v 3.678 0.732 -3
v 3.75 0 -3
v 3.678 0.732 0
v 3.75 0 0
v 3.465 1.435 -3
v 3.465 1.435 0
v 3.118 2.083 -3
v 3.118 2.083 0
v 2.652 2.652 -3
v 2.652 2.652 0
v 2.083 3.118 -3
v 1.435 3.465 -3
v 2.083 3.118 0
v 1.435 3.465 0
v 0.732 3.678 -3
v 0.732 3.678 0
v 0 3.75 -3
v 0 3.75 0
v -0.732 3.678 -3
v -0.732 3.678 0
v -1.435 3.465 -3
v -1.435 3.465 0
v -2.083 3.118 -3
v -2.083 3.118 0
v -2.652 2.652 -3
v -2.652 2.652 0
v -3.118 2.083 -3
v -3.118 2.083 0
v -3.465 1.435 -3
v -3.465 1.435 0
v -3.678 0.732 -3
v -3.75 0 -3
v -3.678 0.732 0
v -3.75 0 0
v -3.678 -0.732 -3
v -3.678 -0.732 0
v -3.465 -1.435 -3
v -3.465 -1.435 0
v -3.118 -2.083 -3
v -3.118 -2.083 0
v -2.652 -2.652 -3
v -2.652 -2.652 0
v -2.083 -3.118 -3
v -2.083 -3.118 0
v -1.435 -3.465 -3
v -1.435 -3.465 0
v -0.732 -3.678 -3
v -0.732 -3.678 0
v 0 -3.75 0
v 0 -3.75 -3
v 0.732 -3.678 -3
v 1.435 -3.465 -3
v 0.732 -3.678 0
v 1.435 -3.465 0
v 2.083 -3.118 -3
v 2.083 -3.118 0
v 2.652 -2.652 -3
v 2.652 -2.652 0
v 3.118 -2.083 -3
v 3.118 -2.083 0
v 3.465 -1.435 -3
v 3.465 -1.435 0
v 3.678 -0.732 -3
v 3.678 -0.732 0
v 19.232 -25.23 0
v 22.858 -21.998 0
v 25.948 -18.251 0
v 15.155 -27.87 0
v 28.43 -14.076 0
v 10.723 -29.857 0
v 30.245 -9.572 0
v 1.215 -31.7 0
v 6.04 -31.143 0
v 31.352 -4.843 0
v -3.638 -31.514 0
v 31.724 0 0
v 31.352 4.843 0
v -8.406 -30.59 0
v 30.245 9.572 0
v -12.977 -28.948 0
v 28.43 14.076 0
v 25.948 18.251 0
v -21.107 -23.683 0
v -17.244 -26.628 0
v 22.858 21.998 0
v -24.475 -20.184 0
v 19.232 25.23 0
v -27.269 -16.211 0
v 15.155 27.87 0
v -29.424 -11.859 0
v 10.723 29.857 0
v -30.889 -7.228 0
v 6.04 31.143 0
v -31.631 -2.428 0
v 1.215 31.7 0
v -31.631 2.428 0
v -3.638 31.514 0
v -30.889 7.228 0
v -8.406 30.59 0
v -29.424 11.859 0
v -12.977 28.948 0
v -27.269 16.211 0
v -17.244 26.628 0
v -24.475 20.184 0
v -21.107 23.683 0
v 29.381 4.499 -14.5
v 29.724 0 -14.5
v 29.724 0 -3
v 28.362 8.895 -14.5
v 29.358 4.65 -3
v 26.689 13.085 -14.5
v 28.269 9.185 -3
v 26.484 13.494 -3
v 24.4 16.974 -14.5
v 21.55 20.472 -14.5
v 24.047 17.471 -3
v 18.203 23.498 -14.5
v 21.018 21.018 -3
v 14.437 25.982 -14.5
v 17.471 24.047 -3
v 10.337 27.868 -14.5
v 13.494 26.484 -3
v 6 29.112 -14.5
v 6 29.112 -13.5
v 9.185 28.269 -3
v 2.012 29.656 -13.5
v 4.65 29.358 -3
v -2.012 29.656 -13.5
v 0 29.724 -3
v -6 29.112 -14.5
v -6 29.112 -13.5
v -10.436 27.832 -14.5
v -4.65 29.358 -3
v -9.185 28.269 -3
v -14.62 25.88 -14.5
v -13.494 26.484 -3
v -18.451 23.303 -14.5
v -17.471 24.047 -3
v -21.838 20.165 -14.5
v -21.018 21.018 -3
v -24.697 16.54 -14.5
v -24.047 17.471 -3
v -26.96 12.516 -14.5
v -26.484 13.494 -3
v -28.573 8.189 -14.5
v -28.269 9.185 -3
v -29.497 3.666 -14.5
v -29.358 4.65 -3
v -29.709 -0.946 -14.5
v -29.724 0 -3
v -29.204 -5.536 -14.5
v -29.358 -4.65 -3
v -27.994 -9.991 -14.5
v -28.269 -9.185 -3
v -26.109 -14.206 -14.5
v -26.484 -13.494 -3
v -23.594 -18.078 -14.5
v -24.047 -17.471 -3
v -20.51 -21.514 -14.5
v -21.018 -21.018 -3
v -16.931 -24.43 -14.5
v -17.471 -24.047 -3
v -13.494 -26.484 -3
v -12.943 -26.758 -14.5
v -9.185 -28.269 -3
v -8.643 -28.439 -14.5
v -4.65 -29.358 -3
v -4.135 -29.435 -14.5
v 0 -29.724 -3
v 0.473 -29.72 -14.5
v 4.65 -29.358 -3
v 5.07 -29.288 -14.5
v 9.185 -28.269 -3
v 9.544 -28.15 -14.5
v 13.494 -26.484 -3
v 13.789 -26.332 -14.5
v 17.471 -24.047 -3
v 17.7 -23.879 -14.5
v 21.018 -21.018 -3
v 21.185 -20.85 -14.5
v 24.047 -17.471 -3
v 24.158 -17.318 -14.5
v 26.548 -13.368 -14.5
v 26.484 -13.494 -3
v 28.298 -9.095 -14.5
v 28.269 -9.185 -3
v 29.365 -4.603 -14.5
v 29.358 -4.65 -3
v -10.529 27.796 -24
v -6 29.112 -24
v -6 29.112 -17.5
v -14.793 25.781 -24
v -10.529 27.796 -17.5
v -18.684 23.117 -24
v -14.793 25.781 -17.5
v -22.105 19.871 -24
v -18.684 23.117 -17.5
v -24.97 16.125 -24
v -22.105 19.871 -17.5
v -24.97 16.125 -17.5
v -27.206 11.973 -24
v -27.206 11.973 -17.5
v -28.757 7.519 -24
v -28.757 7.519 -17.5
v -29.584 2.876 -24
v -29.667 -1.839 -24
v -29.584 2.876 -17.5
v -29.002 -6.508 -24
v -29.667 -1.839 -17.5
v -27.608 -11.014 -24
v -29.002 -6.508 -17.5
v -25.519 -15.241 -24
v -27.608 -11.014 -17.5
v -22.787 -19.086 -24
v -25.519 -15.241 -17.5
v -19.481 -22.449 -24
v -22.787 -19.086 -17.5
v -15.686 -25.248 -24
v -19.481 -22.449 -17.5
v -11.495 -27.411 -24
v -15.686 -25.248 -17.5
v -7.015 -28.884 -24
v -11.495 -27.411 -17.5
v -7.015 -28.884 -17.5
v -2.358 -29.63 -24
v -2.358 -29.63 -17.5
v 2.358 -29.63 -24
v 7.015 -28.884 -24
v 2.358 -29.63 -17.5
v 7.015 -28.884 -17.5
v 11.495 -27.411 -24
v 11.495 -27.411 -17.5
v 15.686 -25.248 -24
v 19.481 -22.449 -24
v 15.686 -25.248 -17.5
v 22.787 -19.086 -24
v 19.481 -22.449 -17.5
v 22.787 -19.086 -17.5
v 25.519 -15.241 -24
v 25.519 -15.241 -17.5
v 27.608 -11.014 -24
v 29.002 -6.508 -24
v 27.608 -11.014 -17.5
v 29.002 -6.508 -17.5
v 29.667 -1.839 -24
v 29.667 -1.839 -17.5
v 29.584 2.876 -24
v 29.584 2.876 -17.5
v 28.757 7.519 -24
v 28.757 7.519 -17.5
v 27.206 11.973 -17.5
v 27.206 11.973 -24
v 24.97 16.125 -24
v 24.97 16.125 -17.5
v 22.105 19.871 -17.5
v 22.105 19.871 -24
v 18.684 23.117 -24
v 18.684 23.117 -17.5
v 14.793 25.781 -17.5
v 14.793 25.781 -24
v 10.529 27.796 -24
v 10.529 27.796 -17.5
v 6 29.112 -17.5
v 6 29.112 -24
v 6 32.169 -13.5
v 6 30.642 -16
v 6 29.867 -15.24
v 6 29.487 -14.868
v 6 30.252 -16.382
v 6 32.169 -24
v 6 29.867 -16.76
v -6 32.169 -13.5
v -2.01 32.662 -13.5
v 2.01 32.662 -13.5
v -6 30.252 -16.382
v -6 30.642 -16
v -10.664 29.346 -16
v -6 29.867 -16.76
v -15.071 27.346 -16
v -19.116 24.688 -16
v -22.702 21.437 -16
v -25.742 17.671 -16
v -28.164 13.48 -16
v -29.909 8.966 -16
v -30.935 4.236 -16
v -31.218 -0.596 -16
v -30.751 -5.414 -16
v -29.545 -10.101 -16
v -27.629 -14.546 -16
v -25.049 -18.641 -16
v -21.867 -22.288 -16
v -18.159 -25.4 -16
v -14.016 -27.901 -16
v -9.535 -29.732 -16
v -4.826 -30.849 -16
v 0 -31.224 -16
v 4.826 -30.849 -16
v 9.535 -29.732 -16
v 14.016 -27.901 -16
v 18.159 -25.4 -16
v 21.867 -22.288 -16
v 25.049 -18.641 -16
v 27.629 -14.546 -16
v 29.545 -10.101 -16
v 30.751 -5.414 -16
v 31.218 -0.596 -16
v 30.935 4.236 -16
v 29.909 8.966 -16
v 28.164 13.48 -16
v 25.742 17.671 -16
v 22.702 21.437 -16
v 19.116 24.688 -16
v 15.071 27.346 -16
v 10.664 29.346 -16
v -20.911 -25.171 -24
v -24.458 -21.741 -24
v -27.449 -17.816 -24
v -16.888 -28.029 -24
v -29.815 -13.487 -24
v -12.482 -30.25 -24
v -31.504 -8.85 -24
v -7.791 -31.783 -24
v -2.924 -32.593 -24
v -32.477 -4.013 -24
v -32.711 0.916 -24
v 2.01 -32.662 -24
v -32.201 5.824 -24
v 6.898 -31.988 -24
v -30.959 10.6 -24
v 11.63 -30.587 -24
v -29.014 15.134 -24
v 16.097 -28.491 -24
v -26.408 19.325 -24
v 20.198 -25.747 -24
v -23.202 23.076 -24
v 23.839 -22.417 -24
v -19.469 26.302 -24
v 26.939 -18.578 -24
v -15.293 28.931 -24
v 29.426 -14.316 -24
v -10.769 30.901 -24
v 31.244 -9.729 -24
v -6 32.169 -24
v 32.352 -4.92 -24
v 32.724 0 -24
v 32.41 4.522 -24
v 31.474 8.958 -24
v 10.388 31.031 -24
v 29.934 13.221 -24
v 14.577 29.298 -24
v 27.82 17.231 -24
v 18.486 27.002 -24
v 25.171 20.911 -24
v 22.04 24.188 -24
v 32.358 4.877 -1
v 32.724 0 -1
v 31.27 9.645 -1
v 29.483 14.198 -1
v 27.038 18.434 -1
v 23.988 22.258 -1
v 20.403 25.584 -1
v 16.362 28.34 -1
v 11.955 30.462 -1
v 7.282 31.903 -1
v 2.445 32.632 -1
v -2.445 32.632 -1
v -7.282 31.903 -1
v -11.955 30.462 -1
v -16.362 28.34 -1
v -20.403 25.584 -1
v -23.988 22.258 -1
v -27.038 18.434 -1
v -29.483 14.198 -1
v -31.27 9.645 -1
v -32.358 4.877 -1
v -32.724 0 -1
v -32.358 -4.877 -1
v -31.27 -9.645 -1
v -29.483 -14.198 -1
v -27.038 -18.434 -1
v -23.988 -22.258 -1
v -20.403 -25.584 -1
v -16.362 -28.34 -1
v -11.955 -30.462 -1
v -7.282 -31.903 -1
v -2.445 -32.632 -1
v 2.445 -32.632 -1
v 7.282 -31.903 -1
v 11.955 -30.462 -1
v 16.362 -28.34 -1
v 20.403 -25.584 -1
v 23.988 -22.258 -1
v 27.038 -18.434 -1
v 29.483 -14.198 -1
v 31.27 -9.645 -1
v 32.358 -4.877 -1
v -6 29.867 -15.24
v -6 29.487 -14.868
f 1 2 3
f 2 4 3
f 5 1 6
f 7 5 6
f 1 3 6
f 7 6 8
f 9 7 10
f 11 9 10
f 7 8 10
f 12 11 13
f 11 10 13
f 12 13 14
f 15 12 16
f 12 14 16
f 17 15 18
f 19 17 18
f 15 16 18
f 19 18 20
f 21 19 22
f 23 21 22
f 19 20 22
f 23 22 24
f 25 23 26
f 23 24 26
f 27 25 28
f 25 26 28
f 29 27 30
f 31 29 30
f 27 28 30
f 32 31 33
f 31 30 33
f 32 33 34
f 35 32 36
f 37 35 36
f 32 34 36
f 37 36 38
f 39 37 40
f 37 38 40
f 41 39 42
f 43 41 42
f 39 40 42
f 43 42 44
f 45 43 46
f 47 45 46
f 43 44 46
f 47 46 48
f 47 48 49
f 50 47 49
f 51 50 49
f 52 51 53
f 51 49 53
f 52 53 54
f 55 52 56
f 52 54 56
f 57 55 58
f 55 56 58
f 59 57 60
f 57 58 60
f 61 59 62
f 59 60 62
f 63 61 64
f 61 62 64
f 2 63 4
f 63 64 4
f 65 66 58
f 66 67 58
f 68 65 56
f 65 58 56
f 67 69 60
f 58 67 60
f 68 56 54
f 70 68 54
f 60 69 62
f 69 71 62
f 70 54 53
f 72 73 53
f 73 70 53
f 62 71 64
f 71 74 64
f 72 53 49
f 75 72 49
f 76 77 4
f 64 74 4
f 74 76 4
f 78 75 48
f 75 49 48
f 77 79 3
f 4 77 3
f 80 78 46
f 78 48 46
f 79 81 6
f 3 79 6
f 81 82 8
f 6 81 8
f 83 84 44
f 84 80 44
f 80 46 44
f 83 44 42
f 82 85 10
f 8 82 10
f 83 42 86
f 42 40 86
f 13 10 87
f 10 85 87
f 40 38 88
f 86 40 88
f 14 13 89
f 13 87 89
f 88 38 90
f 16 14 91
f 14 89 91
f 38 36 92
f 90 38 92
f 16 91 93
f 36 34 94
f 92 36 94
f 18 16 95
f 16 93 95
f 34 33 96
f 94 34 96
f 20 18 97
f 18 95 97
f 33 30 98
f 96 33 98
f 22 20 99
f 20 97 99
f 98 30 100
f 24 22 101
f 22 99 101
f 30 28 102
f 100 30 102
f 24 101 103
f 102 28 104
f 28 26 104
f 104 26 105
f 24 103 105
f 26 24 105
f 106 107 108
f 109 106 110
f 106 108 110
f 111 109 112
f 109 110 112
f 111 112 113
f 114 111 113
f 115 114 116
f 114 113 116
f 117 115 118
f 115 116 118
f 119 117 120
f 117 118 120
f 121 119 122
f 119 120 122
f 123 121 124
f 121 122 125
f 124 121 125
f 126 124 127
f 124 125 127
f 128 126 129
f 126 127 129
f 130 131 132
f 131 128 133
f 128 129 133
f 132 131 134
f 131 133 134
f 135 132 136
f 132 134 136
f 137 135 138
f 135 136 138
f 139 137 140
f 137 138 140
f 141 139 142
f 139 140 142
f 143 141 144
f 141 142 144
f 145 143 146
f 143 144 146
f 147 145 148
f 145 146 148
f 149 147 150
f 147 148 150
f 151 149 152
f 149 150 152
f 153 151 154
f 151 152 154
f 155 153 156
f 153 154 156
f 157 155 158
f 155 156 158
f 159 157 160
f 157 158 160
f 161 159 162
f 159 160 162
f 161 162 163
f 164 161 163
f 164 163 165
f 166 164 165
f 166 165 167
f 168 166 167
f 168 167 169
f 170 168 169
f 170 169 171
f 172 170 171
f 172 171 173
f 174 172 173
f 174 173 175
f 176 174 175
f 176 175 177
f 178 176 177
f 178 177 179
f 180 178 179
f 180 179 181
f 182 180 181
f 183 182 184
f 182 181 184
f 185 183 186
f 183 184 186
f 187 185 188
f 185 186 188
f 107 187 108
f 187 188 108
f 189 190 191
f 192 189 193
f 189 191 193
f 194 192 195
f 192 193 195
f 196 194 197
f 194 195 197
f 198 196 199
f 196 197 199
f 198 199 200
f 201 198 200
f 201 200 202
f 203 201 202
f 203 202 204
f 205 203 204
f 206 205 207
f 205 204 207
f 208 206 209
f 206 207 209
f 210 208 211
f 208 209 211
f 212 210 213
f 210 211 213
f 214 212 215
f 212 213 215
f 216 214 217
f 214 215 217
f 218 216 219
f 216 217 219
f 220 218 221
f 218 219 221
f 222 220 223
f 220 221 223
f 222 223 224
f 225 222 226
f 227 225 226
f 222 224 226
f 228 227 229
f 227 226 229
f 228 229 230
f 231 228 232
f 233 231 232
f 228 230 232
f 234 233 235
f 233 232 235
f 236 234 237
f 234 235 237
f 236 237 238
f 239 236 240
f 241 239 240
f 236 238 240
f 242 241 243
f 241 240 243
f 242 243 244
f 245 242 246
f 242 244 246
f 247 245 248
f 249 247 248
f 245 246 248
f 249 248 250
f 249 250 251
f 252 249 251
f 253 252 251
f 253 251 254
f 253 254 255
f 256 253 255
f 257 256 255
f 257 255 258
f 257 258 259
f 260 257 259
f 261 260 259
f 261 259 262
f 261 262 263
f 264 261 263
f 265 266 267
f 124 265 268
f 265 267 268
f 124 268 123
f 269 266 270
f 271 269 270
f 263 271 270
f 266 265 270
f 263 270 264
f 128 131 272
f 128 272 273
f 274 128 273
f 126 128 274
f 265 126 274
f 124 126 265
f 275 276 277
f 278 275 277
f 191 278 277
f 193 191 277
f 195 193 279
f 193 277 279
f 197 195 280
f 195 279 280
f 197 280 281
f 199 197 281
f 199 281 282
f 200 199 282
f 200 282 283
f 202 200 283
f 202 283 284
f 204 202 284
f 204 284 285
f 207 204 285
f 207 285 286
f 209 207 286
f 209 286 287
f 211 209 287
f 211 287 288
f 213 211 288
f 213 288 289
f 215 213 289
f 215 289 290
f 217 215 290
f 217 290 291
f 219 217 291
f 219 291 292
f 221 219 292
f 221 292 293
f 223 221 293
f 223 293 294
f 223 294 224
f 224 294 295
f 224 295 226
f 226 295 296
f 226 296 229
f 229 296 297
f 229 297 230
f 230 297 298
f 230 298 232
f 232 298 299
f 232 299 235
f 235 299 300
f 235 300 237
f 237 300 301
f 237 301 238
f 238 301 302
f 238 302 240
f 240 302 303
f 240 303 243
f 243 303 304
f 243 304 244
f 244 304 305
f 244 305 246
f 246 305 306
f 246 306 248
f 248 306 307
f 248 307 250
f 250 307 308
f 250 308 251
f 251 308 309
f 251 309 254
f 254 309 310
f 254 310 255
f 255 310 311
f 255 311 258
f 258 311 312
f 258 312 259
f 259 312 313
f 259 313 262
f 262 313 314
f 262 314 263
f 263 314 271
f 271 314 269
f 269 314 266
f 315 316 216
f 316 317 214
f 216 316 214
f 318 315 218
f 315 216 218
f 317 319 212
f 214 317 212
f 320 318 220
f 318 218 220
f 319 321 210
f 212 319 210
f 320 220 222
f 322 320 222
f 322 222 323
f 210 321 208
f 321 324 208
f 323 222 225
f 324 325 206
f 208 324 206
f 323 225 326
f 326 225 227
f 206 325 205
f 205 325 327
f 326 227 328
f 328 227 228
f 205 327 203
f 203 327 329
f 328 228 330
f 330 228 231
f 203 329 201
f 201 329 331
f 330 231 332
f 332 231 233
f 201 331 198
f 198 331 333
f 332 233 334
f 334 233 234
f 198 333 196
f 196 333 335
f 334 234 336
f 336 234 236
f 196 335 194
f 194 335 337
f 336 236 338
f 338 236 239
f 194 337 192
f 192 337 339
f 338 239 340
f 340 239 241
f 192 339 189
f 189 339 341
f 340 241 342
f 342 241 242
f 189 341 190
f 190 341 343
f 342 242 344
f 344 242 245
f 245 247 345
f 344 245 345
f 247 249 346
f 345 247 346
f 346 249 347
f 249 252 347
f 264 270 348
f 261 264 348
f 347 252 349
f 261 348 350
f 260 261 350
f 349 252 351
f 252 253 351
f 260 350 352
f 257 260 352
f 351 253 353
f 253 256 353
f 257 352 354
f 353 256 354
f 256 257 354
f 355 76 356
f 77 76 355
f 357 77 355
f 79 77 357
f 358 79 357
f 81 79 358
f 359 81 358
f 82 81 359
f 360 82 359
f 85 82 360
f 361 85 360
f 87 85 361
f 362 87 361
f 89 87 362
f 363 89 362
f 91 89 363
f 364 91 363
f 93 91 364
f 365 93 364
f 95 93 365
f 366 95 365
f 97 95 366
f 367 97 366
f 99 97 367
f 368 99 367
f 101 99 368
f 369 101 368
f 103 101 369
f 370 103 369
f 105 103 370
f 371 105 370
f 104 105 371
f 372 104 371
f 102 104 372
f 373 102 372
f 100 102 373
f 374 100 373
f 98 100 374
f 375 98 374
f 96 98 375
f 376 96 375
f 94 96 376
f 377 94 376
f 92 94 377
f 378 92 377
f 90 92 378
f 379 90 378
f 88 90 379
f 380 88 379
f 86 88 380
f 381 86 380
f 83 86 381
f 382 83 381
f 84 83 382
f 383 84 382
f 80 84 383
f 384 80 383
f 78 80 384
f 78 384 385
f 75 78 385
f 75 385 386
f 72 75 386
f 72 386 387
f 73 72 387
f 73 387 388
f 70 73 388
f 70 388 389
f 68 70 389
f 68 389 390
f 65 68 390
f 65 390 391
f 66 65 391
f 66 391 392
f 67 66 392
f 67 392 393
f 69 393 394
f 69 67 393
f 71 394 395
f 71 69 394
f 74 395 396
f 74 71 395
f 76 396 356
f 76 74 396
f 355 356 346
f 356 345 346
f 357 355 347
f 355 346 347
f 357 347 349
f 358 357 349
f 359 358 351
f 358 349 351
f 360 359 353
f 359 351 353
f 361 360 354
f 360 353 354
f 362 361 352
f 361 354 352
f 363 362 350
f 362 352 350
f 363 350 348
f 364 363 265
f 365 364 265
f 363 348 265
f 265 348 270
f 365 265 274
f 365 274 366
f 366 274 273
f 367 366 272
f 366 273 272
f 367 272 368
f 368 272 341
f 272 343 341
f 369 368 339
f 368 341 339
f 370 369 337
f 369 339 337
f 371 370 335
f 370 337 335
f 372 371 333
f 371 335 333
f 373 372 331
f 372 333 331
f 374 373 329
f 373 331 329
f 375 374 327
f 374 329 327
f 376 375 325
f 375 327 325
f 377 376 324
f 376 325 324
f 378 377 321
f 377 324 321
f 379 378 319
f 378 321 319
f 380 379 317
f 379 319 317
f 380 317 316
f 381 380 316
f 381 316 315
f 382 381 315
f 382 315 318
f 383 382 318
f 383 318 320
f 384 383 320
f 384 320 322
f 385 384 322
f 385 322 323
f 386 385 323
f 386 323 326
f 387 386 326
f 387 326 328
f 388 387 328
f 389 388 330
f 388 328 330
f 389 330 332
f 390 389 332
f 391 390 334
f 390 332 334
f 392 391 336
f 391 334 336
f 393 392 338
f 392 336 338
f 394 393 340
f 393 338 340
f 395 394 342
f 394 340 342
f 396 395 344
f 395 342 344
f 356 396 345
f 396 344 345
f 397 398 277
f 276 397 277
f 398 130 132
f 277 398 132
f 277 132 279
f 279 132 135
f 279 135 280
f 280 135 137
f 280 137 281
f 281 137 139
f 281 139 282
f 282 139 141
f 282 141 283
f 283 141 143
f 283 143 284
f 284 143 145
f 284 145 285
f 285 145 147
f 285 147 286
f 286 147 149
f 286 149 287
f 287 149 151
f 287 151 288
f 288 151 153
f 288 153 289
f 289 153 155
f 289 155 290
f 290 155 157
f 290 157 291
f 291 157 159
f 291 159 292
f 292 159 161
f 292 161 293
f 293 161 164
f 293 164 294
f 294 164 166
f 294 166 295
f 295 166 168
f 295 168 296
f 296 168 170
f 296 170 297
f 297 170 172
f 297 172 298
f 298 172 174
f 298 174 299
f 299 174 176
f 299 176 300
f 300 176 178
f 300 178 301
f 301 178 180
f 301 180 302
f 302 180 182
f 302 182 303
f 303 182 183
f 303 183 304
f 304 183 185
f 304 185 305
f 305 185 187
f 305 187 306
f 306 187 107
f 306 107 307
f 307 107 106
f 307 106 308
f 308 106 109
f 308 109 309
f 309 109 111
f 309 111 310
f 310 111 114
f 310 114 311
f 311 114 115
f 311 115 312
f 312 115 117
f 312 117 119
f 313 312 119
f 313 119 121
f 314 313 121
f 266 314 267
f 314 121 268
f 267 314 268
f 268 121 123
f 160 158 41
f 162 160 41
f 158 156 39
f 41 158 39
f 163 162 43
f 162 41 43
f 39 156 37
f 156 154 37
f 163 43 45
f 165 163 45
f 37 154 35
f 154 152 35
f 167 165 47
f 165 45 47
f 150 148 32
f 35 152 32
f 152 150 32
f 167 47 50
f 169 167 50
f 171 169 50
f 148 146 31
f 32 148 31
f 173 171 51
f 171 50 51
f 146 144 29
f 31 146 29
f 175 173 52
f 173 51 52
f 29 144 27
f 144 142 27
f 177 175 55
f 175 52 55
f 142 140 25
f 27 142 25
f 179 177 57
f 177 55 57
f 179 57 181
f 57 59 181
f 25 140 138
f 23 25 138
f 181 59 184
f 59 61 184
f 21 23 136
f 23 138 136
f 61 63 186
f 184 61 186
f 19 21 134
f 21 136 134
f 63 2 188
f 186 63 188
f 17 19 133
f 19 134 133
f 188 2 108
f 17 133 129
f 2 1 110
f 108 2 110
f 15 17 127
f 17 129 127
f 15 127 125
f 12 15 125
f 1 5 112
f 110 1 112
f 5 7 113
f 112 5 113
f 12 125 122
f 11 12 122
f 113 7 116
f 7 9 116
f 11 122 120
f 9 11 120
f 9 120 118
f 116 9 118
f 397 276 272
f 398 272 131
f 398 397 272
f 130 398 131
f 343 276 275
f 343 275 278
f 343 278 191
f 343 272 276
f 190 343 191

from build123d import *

# Parameters (mm, degrees)
CHAMFER_SIZE    = 1
SKETCH003_W     = 12
SKETCH003_H     = 50
POCKET001_DEPTH = 10.5


with BuildPart() as part:
    # Sketch002 → Revolution (revolve)
    with BuildSketch(Plane.XZ):
        Polygon((32.72376, 0), (32.72376, -24), (29.72376, -24), (29.72376, -17.5), (31.22376, -16), (29.72376, -14.5), (29.72376, -3), (3.75, -3), (3.75, 0), align=None)
    revolve(axis=Axis((0, 0, 0), (0, 0, 1)))

    # Chamfer
    chamfer_edges = [part.edges().sort_by_distance(p)[0] for p in [
        (-32.72376, 0, 0),
    ]]
    chamfer(chamfer_edges, length=CHAMFER_SIZE)

    # Sketch003 (on Face6 of Chamfer) → Pocket001 (cut)
    with BuildSketch(Plane(origin=(0, 0, -24), x_dir=(1, 0, 0), z_dir=(0, 0, -1))):
        with Locations((0, -25)):
            Rectangle(SKETCH003_W, SKETCH003_H)
    extrude(amount=-POCKET001_DEPTH, mode=Mode.SUBTRACT)


solid = part.part
